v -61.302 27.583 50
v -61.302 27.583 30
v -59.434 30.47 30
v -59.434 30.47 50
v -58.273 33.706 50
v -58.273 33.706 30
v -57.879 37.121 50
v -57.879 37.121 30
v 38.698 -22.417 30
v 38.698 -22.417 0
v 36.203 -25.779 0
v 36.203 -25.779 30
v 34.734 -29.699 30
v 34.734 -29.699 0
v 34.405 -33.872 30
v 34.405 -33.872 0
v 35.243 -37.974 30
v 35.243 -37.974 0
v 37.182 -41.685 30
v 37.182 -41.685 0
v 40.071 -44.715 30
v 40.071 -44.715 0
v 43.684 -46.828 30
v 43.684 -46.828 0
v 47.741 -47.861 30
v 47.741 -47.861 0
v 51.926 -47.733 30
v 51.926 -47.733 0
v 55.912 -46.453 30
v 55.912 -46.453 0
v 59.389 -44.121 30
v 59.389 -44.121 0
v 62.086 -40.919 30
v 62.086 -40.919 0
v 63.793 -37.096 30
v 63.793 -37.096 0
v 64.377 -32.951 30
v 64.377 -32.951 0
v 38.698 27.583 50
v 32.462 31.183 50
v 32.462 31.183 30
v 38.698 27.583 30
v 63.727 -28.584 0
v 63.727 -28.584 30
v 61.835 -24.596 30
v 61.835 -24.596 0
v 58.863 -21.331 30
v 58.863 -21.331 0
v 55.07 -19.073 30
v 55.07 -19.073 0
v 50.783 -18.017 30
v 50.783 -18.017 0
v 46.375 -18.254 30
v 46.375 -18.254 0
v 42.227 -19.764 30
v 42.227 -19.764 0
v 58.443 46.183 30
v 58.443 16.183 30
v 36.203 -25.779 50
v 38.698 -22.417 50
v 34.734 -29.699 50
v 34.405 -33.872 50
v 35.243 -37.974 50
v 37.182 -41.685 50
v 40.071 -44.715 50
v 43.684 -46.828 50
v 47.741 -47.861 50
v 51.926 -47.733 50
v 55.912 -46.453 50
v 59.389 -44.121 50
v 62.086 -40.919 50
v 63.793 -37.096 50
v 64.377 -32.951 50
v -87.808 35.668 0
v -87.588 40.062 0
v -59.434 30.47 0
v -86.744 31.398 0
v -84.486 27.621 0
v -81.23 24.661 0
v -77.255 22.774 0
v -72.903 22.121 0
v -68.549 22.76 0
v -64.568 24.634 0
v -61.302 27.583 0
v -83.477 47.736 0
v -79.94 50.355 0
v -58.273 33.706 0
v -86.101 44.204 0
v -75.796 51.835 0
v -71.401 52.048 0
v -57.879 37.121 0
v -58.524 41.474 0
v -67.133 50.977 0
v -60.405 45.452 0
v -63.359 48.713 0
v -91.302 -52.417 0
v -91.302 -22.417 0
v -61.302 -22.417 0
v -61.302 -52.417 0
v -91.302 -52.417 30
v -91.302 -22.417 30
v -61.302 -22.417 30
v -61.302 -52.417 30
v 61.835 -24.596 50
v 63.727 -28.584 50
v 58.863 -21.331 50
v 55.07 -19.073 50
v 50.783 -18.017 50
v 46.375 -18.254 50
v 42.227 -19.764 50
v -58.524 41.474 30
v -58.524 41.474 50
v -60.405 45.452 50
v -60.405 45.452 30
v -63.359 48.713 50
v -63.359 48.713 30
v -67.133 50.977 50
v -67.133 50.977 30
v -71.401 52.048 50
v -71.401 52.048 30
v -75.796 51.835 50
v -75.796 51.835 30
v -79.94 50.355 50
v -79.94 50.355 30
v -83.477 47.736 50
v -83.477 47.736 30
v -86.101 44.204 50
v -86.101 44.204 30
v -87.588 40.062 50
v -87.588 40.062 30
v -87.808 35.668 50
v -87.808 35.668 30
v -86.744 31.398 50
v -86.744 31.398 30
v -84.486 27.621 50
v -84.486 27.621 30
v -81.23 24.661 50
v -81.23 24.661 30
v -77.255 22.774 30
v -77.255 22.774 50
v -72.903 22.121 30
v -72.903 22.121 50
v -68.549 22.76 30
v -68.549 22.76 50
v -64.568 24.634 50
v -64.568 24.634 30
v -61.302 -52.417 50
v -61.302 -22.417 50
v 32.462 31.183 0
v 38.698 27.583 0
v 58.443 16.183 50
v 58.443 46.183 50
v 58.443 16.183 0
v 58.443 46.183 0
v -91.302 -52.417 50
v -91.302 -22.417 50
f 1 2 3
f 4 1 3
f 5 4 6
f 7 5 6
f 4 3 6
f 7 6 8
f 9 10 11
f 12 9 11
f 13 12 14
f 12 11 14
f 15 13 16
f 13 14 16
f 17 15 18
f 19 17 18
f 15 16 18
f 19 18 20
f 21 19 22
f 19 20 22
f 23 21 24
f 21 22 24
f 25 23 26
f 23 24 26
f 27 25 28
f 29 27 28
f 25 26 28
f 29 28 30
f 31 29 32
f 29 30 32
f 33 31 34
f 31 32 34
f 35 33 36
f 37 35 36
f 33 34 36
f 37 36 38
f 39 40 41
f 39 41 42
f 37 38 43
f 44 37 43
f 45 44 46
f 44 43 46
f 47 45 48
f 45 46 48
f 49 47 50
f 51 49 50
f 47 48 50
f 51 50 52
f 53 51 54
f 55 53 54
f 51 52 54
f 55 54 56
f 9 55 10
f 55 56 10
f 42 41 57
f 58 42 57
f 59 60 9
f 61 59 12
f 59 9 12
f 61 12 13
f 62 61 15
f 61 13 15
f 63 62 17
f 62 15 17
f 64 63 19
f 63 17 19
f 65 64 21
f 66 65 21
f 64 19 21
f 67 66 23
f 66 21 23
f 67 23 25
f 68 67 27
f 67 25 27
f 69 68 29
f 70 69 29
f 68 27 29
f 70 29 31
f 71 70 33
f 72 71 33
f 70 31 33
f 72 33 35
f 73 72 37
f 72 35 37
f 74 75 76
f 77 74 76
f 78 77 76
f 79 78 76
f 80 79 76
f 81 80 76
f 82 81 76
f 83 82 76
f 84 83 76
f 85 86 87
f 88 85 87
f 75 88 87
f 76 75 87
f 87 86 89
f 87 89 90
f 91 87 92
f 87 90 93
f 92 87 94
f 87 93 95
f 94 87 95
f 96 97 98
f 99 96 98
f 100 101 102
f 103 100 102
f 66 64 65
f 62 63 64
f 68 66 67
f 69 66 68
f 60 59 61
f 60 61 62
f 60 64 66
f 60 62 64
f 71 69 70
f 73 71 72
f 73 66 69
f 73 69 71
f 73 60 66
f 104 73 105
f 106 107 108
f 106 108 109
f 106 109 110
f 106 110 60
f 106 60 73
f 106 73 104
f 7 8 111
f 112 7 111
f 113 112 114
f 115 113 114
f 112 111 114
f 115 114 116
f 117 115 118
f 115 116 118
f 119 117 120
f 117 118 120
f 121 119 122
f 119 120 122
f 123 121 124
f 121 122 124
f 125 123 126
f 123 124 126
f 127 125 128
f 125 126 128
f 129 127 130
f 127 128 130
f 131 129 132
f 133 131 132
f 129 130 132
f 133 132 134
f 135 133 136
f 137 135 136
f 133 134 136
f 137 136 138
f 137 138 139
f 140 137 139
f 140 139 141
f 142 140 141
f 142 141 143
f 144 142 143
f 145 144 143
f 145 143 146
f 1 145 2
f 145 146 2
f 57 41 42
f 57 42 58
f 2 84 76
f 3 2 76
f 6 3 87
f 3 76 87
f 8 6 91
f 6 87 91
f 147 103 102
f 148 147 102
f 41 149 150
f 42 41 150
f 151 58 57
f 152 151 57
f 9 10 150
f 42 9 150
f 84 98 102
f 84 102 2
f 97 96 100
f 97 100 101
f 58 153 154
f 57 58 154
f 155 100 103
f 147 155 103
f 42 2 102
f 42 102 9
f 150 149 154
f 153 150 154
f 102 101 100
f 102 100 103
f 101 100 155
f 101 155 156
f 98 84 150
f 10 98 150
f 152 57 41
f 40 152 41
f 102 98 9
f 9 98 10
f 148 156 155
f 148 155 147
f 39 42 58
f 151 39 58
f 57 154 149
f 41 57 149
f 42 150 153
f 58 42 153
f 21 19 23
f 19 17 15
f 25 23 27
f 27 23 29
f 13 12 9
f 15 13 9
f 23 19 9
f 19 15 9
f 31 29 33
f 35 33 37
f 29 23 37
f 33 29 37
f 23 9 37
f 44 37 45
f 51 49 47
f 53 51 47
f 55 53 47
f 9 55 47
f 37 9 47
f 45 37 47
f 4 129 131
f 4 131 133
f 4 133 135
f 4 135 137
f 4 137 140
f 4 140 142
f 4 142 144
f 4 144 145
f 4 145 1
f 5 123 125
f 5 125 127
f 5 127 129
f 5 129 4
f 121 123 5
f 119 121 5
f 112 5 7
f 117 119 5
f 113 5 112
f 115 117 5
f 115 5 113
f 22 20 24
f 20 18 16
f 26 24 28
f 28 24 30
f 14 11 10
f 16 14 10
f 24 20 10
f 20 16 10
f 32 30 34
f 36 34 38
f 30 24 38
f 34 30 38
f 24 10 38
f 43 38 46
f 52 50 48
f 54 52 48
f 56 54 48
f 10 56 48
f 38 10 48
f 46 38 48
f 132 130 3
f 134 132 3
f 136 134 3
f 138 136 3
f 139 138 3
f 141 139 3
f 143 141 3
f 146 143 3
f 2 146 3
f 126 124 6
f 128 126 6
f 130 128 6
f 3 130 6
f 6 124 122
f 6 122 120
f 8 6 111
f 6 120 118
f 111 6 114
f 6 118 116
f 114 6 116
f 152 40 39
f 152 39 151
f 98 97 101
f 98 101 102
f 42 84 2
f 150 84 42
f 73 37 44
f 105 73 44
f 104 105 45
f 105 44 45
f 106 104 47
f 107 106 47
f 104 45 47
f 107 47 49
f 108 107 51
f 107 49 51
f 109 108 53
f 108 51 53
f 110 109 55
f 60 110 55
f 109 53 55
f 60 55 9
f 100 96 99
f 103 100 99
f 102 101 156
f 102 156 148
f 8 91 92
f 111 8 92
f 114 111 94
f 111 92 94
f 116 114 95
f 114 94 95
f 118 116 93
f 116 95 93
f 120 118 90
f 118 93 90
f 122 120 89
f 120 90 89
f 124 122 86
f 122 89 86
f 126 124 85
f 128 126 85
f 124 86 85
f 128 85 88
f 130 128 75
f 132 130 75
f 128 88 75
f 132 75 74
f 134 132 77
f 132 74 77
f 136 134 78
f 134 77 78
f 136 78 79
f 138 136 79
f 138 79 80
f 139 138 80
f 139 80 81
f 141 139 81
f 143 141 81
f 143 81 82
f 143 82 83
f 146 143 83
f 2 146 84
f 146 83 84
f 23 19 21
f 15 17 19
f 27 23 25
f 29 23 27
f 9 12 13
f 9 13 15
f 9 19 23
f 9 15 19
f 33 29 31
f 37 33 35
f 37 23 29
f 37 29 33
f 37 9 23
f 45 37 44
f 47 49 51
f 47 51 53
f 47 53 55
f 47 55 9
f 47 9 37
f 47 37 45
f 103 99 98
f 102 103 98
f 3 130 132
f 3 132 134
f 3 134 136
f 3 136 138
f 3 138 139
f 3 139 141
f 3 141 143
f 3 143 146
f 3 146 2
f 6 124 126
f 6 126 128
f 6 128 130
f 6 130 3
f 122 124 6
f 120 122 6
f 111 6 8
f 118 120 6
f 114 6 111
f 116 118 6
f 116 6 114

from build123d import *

# Parameters (mm, degrees)
F1_DEPTH = 30
F0_W     = 30
F0_H     = 30
F0_W_2   = 100
F0_H_2   = 50
F2_DEPTH = 20


with BuildPart() as f1:
    # F0 (on Top) → F1 (new body)
    with BuildSketch(Plane.XY):
        Polygon((32.46210035, 31.1833690802), (38.6980388133, 27.5830483298), (58.4428624636, 16.1833690802), (58.4428624636, 46.1833690802), align=None)
    extrude(amount=F1_DEPTH)


with BuildPart() as f1b:
    # F0 (on Top) → F1, piece 2 (new body)
    with BuildSketch(Plane.XY):
        with BuildLine():
            ThreePointArc((64.3769583364, -32.9507391096), (55.0697699069, -19.072990862), (38.6980388133, -22.4169516702))
            ThreePointArc((38.6980388133, -22.4169516702), (43.684146766, -46.8284873572), (64.3769583364, -32.9507391096))
        make_face()
    extrude(amount=F1_DEPTH)


with BuildPart() as f1c:
    # F0 (on Top) → F1, piece 3 (new body)
    with BuildSketch(Plane.XY):
        with Locations((-76.3019611867, -37.4169516702)):
            Rectangle(F0_W, F0_H)
    extrude(amount=F1_DEPTH)


with BuildPart() as f1d:
    # F0 (on Top) → F1, piece 4 (new body)
    with BuildSketch(Plane.XY):
        with Locations((-11.3019611867, 2.5830483298)):
            Rectangle(F0_W_2, F0_H_2)
    extrude(amount=F1_DEPTH)


with BuildPart() as f1e:
    # F0 (on Top) → F1, piece 5 (new body)
    with BuildSketch(Plane.XY):
        with BuildLine():
            ThreePointArc((-57.8788017667, 37.1212222738), (-86.9970985602, 42.1881439873), (-61.3019611867, 27.5830483298))
            ThreePointArc((-61.3019611867, 27.5830483298), (-58.7605049732, 32.0543005604), (-57.8788017667, 37.1212222738))
        make_face()
    extrude(amount=F1_DEPTH)


with BuildPart() as f2:
    # F2 (new): a face of the model
    f2_faces = [f1.part.faces().sort_by_distance(p)[0] for p in [
        (49.7826084257, 31.1833690802, 30),
    ]]
    extrude(f2_faces, amount=F2_DEPTH)


with BuildPart() as f2b:
    # F2#2 (new): a face of the model
    f2_2_faces = [f1b.part.faces().sort_by_distance(p)[0] for p in [
        (49.3769583364, -32.9507391096, 30),
    ]]
    extrude(f2_2_faces, amount=F2_DEPTH)


with BuildPart() as f2c:
    # F2#3 (new): a face of the model
    f2_3_faces = [f1c.part.faces().sort_by_distance(p)[0] for p in [
        (-76.3019611867, -37.4169516702, 30),
    ]]
    extrude(f2_3_faces, amount=F2_DEPTH)


with BuildPart() as f2d:
    # F2#4 (new): a face of the model
    f2_4_faces = [f1e.part.faces().sort_by_distance(p)[0] for p in [
        (-72.8788017667, 37.1212222738, 30),
    ]]
    extrude(f2_4_faces, amount=F2_DEPTH)


solid = Compound([f1.part, f1b.part, f1c.part, f1d.part, f1e.part, f2.part, f2b.part, f2c.part, f2d.part])
